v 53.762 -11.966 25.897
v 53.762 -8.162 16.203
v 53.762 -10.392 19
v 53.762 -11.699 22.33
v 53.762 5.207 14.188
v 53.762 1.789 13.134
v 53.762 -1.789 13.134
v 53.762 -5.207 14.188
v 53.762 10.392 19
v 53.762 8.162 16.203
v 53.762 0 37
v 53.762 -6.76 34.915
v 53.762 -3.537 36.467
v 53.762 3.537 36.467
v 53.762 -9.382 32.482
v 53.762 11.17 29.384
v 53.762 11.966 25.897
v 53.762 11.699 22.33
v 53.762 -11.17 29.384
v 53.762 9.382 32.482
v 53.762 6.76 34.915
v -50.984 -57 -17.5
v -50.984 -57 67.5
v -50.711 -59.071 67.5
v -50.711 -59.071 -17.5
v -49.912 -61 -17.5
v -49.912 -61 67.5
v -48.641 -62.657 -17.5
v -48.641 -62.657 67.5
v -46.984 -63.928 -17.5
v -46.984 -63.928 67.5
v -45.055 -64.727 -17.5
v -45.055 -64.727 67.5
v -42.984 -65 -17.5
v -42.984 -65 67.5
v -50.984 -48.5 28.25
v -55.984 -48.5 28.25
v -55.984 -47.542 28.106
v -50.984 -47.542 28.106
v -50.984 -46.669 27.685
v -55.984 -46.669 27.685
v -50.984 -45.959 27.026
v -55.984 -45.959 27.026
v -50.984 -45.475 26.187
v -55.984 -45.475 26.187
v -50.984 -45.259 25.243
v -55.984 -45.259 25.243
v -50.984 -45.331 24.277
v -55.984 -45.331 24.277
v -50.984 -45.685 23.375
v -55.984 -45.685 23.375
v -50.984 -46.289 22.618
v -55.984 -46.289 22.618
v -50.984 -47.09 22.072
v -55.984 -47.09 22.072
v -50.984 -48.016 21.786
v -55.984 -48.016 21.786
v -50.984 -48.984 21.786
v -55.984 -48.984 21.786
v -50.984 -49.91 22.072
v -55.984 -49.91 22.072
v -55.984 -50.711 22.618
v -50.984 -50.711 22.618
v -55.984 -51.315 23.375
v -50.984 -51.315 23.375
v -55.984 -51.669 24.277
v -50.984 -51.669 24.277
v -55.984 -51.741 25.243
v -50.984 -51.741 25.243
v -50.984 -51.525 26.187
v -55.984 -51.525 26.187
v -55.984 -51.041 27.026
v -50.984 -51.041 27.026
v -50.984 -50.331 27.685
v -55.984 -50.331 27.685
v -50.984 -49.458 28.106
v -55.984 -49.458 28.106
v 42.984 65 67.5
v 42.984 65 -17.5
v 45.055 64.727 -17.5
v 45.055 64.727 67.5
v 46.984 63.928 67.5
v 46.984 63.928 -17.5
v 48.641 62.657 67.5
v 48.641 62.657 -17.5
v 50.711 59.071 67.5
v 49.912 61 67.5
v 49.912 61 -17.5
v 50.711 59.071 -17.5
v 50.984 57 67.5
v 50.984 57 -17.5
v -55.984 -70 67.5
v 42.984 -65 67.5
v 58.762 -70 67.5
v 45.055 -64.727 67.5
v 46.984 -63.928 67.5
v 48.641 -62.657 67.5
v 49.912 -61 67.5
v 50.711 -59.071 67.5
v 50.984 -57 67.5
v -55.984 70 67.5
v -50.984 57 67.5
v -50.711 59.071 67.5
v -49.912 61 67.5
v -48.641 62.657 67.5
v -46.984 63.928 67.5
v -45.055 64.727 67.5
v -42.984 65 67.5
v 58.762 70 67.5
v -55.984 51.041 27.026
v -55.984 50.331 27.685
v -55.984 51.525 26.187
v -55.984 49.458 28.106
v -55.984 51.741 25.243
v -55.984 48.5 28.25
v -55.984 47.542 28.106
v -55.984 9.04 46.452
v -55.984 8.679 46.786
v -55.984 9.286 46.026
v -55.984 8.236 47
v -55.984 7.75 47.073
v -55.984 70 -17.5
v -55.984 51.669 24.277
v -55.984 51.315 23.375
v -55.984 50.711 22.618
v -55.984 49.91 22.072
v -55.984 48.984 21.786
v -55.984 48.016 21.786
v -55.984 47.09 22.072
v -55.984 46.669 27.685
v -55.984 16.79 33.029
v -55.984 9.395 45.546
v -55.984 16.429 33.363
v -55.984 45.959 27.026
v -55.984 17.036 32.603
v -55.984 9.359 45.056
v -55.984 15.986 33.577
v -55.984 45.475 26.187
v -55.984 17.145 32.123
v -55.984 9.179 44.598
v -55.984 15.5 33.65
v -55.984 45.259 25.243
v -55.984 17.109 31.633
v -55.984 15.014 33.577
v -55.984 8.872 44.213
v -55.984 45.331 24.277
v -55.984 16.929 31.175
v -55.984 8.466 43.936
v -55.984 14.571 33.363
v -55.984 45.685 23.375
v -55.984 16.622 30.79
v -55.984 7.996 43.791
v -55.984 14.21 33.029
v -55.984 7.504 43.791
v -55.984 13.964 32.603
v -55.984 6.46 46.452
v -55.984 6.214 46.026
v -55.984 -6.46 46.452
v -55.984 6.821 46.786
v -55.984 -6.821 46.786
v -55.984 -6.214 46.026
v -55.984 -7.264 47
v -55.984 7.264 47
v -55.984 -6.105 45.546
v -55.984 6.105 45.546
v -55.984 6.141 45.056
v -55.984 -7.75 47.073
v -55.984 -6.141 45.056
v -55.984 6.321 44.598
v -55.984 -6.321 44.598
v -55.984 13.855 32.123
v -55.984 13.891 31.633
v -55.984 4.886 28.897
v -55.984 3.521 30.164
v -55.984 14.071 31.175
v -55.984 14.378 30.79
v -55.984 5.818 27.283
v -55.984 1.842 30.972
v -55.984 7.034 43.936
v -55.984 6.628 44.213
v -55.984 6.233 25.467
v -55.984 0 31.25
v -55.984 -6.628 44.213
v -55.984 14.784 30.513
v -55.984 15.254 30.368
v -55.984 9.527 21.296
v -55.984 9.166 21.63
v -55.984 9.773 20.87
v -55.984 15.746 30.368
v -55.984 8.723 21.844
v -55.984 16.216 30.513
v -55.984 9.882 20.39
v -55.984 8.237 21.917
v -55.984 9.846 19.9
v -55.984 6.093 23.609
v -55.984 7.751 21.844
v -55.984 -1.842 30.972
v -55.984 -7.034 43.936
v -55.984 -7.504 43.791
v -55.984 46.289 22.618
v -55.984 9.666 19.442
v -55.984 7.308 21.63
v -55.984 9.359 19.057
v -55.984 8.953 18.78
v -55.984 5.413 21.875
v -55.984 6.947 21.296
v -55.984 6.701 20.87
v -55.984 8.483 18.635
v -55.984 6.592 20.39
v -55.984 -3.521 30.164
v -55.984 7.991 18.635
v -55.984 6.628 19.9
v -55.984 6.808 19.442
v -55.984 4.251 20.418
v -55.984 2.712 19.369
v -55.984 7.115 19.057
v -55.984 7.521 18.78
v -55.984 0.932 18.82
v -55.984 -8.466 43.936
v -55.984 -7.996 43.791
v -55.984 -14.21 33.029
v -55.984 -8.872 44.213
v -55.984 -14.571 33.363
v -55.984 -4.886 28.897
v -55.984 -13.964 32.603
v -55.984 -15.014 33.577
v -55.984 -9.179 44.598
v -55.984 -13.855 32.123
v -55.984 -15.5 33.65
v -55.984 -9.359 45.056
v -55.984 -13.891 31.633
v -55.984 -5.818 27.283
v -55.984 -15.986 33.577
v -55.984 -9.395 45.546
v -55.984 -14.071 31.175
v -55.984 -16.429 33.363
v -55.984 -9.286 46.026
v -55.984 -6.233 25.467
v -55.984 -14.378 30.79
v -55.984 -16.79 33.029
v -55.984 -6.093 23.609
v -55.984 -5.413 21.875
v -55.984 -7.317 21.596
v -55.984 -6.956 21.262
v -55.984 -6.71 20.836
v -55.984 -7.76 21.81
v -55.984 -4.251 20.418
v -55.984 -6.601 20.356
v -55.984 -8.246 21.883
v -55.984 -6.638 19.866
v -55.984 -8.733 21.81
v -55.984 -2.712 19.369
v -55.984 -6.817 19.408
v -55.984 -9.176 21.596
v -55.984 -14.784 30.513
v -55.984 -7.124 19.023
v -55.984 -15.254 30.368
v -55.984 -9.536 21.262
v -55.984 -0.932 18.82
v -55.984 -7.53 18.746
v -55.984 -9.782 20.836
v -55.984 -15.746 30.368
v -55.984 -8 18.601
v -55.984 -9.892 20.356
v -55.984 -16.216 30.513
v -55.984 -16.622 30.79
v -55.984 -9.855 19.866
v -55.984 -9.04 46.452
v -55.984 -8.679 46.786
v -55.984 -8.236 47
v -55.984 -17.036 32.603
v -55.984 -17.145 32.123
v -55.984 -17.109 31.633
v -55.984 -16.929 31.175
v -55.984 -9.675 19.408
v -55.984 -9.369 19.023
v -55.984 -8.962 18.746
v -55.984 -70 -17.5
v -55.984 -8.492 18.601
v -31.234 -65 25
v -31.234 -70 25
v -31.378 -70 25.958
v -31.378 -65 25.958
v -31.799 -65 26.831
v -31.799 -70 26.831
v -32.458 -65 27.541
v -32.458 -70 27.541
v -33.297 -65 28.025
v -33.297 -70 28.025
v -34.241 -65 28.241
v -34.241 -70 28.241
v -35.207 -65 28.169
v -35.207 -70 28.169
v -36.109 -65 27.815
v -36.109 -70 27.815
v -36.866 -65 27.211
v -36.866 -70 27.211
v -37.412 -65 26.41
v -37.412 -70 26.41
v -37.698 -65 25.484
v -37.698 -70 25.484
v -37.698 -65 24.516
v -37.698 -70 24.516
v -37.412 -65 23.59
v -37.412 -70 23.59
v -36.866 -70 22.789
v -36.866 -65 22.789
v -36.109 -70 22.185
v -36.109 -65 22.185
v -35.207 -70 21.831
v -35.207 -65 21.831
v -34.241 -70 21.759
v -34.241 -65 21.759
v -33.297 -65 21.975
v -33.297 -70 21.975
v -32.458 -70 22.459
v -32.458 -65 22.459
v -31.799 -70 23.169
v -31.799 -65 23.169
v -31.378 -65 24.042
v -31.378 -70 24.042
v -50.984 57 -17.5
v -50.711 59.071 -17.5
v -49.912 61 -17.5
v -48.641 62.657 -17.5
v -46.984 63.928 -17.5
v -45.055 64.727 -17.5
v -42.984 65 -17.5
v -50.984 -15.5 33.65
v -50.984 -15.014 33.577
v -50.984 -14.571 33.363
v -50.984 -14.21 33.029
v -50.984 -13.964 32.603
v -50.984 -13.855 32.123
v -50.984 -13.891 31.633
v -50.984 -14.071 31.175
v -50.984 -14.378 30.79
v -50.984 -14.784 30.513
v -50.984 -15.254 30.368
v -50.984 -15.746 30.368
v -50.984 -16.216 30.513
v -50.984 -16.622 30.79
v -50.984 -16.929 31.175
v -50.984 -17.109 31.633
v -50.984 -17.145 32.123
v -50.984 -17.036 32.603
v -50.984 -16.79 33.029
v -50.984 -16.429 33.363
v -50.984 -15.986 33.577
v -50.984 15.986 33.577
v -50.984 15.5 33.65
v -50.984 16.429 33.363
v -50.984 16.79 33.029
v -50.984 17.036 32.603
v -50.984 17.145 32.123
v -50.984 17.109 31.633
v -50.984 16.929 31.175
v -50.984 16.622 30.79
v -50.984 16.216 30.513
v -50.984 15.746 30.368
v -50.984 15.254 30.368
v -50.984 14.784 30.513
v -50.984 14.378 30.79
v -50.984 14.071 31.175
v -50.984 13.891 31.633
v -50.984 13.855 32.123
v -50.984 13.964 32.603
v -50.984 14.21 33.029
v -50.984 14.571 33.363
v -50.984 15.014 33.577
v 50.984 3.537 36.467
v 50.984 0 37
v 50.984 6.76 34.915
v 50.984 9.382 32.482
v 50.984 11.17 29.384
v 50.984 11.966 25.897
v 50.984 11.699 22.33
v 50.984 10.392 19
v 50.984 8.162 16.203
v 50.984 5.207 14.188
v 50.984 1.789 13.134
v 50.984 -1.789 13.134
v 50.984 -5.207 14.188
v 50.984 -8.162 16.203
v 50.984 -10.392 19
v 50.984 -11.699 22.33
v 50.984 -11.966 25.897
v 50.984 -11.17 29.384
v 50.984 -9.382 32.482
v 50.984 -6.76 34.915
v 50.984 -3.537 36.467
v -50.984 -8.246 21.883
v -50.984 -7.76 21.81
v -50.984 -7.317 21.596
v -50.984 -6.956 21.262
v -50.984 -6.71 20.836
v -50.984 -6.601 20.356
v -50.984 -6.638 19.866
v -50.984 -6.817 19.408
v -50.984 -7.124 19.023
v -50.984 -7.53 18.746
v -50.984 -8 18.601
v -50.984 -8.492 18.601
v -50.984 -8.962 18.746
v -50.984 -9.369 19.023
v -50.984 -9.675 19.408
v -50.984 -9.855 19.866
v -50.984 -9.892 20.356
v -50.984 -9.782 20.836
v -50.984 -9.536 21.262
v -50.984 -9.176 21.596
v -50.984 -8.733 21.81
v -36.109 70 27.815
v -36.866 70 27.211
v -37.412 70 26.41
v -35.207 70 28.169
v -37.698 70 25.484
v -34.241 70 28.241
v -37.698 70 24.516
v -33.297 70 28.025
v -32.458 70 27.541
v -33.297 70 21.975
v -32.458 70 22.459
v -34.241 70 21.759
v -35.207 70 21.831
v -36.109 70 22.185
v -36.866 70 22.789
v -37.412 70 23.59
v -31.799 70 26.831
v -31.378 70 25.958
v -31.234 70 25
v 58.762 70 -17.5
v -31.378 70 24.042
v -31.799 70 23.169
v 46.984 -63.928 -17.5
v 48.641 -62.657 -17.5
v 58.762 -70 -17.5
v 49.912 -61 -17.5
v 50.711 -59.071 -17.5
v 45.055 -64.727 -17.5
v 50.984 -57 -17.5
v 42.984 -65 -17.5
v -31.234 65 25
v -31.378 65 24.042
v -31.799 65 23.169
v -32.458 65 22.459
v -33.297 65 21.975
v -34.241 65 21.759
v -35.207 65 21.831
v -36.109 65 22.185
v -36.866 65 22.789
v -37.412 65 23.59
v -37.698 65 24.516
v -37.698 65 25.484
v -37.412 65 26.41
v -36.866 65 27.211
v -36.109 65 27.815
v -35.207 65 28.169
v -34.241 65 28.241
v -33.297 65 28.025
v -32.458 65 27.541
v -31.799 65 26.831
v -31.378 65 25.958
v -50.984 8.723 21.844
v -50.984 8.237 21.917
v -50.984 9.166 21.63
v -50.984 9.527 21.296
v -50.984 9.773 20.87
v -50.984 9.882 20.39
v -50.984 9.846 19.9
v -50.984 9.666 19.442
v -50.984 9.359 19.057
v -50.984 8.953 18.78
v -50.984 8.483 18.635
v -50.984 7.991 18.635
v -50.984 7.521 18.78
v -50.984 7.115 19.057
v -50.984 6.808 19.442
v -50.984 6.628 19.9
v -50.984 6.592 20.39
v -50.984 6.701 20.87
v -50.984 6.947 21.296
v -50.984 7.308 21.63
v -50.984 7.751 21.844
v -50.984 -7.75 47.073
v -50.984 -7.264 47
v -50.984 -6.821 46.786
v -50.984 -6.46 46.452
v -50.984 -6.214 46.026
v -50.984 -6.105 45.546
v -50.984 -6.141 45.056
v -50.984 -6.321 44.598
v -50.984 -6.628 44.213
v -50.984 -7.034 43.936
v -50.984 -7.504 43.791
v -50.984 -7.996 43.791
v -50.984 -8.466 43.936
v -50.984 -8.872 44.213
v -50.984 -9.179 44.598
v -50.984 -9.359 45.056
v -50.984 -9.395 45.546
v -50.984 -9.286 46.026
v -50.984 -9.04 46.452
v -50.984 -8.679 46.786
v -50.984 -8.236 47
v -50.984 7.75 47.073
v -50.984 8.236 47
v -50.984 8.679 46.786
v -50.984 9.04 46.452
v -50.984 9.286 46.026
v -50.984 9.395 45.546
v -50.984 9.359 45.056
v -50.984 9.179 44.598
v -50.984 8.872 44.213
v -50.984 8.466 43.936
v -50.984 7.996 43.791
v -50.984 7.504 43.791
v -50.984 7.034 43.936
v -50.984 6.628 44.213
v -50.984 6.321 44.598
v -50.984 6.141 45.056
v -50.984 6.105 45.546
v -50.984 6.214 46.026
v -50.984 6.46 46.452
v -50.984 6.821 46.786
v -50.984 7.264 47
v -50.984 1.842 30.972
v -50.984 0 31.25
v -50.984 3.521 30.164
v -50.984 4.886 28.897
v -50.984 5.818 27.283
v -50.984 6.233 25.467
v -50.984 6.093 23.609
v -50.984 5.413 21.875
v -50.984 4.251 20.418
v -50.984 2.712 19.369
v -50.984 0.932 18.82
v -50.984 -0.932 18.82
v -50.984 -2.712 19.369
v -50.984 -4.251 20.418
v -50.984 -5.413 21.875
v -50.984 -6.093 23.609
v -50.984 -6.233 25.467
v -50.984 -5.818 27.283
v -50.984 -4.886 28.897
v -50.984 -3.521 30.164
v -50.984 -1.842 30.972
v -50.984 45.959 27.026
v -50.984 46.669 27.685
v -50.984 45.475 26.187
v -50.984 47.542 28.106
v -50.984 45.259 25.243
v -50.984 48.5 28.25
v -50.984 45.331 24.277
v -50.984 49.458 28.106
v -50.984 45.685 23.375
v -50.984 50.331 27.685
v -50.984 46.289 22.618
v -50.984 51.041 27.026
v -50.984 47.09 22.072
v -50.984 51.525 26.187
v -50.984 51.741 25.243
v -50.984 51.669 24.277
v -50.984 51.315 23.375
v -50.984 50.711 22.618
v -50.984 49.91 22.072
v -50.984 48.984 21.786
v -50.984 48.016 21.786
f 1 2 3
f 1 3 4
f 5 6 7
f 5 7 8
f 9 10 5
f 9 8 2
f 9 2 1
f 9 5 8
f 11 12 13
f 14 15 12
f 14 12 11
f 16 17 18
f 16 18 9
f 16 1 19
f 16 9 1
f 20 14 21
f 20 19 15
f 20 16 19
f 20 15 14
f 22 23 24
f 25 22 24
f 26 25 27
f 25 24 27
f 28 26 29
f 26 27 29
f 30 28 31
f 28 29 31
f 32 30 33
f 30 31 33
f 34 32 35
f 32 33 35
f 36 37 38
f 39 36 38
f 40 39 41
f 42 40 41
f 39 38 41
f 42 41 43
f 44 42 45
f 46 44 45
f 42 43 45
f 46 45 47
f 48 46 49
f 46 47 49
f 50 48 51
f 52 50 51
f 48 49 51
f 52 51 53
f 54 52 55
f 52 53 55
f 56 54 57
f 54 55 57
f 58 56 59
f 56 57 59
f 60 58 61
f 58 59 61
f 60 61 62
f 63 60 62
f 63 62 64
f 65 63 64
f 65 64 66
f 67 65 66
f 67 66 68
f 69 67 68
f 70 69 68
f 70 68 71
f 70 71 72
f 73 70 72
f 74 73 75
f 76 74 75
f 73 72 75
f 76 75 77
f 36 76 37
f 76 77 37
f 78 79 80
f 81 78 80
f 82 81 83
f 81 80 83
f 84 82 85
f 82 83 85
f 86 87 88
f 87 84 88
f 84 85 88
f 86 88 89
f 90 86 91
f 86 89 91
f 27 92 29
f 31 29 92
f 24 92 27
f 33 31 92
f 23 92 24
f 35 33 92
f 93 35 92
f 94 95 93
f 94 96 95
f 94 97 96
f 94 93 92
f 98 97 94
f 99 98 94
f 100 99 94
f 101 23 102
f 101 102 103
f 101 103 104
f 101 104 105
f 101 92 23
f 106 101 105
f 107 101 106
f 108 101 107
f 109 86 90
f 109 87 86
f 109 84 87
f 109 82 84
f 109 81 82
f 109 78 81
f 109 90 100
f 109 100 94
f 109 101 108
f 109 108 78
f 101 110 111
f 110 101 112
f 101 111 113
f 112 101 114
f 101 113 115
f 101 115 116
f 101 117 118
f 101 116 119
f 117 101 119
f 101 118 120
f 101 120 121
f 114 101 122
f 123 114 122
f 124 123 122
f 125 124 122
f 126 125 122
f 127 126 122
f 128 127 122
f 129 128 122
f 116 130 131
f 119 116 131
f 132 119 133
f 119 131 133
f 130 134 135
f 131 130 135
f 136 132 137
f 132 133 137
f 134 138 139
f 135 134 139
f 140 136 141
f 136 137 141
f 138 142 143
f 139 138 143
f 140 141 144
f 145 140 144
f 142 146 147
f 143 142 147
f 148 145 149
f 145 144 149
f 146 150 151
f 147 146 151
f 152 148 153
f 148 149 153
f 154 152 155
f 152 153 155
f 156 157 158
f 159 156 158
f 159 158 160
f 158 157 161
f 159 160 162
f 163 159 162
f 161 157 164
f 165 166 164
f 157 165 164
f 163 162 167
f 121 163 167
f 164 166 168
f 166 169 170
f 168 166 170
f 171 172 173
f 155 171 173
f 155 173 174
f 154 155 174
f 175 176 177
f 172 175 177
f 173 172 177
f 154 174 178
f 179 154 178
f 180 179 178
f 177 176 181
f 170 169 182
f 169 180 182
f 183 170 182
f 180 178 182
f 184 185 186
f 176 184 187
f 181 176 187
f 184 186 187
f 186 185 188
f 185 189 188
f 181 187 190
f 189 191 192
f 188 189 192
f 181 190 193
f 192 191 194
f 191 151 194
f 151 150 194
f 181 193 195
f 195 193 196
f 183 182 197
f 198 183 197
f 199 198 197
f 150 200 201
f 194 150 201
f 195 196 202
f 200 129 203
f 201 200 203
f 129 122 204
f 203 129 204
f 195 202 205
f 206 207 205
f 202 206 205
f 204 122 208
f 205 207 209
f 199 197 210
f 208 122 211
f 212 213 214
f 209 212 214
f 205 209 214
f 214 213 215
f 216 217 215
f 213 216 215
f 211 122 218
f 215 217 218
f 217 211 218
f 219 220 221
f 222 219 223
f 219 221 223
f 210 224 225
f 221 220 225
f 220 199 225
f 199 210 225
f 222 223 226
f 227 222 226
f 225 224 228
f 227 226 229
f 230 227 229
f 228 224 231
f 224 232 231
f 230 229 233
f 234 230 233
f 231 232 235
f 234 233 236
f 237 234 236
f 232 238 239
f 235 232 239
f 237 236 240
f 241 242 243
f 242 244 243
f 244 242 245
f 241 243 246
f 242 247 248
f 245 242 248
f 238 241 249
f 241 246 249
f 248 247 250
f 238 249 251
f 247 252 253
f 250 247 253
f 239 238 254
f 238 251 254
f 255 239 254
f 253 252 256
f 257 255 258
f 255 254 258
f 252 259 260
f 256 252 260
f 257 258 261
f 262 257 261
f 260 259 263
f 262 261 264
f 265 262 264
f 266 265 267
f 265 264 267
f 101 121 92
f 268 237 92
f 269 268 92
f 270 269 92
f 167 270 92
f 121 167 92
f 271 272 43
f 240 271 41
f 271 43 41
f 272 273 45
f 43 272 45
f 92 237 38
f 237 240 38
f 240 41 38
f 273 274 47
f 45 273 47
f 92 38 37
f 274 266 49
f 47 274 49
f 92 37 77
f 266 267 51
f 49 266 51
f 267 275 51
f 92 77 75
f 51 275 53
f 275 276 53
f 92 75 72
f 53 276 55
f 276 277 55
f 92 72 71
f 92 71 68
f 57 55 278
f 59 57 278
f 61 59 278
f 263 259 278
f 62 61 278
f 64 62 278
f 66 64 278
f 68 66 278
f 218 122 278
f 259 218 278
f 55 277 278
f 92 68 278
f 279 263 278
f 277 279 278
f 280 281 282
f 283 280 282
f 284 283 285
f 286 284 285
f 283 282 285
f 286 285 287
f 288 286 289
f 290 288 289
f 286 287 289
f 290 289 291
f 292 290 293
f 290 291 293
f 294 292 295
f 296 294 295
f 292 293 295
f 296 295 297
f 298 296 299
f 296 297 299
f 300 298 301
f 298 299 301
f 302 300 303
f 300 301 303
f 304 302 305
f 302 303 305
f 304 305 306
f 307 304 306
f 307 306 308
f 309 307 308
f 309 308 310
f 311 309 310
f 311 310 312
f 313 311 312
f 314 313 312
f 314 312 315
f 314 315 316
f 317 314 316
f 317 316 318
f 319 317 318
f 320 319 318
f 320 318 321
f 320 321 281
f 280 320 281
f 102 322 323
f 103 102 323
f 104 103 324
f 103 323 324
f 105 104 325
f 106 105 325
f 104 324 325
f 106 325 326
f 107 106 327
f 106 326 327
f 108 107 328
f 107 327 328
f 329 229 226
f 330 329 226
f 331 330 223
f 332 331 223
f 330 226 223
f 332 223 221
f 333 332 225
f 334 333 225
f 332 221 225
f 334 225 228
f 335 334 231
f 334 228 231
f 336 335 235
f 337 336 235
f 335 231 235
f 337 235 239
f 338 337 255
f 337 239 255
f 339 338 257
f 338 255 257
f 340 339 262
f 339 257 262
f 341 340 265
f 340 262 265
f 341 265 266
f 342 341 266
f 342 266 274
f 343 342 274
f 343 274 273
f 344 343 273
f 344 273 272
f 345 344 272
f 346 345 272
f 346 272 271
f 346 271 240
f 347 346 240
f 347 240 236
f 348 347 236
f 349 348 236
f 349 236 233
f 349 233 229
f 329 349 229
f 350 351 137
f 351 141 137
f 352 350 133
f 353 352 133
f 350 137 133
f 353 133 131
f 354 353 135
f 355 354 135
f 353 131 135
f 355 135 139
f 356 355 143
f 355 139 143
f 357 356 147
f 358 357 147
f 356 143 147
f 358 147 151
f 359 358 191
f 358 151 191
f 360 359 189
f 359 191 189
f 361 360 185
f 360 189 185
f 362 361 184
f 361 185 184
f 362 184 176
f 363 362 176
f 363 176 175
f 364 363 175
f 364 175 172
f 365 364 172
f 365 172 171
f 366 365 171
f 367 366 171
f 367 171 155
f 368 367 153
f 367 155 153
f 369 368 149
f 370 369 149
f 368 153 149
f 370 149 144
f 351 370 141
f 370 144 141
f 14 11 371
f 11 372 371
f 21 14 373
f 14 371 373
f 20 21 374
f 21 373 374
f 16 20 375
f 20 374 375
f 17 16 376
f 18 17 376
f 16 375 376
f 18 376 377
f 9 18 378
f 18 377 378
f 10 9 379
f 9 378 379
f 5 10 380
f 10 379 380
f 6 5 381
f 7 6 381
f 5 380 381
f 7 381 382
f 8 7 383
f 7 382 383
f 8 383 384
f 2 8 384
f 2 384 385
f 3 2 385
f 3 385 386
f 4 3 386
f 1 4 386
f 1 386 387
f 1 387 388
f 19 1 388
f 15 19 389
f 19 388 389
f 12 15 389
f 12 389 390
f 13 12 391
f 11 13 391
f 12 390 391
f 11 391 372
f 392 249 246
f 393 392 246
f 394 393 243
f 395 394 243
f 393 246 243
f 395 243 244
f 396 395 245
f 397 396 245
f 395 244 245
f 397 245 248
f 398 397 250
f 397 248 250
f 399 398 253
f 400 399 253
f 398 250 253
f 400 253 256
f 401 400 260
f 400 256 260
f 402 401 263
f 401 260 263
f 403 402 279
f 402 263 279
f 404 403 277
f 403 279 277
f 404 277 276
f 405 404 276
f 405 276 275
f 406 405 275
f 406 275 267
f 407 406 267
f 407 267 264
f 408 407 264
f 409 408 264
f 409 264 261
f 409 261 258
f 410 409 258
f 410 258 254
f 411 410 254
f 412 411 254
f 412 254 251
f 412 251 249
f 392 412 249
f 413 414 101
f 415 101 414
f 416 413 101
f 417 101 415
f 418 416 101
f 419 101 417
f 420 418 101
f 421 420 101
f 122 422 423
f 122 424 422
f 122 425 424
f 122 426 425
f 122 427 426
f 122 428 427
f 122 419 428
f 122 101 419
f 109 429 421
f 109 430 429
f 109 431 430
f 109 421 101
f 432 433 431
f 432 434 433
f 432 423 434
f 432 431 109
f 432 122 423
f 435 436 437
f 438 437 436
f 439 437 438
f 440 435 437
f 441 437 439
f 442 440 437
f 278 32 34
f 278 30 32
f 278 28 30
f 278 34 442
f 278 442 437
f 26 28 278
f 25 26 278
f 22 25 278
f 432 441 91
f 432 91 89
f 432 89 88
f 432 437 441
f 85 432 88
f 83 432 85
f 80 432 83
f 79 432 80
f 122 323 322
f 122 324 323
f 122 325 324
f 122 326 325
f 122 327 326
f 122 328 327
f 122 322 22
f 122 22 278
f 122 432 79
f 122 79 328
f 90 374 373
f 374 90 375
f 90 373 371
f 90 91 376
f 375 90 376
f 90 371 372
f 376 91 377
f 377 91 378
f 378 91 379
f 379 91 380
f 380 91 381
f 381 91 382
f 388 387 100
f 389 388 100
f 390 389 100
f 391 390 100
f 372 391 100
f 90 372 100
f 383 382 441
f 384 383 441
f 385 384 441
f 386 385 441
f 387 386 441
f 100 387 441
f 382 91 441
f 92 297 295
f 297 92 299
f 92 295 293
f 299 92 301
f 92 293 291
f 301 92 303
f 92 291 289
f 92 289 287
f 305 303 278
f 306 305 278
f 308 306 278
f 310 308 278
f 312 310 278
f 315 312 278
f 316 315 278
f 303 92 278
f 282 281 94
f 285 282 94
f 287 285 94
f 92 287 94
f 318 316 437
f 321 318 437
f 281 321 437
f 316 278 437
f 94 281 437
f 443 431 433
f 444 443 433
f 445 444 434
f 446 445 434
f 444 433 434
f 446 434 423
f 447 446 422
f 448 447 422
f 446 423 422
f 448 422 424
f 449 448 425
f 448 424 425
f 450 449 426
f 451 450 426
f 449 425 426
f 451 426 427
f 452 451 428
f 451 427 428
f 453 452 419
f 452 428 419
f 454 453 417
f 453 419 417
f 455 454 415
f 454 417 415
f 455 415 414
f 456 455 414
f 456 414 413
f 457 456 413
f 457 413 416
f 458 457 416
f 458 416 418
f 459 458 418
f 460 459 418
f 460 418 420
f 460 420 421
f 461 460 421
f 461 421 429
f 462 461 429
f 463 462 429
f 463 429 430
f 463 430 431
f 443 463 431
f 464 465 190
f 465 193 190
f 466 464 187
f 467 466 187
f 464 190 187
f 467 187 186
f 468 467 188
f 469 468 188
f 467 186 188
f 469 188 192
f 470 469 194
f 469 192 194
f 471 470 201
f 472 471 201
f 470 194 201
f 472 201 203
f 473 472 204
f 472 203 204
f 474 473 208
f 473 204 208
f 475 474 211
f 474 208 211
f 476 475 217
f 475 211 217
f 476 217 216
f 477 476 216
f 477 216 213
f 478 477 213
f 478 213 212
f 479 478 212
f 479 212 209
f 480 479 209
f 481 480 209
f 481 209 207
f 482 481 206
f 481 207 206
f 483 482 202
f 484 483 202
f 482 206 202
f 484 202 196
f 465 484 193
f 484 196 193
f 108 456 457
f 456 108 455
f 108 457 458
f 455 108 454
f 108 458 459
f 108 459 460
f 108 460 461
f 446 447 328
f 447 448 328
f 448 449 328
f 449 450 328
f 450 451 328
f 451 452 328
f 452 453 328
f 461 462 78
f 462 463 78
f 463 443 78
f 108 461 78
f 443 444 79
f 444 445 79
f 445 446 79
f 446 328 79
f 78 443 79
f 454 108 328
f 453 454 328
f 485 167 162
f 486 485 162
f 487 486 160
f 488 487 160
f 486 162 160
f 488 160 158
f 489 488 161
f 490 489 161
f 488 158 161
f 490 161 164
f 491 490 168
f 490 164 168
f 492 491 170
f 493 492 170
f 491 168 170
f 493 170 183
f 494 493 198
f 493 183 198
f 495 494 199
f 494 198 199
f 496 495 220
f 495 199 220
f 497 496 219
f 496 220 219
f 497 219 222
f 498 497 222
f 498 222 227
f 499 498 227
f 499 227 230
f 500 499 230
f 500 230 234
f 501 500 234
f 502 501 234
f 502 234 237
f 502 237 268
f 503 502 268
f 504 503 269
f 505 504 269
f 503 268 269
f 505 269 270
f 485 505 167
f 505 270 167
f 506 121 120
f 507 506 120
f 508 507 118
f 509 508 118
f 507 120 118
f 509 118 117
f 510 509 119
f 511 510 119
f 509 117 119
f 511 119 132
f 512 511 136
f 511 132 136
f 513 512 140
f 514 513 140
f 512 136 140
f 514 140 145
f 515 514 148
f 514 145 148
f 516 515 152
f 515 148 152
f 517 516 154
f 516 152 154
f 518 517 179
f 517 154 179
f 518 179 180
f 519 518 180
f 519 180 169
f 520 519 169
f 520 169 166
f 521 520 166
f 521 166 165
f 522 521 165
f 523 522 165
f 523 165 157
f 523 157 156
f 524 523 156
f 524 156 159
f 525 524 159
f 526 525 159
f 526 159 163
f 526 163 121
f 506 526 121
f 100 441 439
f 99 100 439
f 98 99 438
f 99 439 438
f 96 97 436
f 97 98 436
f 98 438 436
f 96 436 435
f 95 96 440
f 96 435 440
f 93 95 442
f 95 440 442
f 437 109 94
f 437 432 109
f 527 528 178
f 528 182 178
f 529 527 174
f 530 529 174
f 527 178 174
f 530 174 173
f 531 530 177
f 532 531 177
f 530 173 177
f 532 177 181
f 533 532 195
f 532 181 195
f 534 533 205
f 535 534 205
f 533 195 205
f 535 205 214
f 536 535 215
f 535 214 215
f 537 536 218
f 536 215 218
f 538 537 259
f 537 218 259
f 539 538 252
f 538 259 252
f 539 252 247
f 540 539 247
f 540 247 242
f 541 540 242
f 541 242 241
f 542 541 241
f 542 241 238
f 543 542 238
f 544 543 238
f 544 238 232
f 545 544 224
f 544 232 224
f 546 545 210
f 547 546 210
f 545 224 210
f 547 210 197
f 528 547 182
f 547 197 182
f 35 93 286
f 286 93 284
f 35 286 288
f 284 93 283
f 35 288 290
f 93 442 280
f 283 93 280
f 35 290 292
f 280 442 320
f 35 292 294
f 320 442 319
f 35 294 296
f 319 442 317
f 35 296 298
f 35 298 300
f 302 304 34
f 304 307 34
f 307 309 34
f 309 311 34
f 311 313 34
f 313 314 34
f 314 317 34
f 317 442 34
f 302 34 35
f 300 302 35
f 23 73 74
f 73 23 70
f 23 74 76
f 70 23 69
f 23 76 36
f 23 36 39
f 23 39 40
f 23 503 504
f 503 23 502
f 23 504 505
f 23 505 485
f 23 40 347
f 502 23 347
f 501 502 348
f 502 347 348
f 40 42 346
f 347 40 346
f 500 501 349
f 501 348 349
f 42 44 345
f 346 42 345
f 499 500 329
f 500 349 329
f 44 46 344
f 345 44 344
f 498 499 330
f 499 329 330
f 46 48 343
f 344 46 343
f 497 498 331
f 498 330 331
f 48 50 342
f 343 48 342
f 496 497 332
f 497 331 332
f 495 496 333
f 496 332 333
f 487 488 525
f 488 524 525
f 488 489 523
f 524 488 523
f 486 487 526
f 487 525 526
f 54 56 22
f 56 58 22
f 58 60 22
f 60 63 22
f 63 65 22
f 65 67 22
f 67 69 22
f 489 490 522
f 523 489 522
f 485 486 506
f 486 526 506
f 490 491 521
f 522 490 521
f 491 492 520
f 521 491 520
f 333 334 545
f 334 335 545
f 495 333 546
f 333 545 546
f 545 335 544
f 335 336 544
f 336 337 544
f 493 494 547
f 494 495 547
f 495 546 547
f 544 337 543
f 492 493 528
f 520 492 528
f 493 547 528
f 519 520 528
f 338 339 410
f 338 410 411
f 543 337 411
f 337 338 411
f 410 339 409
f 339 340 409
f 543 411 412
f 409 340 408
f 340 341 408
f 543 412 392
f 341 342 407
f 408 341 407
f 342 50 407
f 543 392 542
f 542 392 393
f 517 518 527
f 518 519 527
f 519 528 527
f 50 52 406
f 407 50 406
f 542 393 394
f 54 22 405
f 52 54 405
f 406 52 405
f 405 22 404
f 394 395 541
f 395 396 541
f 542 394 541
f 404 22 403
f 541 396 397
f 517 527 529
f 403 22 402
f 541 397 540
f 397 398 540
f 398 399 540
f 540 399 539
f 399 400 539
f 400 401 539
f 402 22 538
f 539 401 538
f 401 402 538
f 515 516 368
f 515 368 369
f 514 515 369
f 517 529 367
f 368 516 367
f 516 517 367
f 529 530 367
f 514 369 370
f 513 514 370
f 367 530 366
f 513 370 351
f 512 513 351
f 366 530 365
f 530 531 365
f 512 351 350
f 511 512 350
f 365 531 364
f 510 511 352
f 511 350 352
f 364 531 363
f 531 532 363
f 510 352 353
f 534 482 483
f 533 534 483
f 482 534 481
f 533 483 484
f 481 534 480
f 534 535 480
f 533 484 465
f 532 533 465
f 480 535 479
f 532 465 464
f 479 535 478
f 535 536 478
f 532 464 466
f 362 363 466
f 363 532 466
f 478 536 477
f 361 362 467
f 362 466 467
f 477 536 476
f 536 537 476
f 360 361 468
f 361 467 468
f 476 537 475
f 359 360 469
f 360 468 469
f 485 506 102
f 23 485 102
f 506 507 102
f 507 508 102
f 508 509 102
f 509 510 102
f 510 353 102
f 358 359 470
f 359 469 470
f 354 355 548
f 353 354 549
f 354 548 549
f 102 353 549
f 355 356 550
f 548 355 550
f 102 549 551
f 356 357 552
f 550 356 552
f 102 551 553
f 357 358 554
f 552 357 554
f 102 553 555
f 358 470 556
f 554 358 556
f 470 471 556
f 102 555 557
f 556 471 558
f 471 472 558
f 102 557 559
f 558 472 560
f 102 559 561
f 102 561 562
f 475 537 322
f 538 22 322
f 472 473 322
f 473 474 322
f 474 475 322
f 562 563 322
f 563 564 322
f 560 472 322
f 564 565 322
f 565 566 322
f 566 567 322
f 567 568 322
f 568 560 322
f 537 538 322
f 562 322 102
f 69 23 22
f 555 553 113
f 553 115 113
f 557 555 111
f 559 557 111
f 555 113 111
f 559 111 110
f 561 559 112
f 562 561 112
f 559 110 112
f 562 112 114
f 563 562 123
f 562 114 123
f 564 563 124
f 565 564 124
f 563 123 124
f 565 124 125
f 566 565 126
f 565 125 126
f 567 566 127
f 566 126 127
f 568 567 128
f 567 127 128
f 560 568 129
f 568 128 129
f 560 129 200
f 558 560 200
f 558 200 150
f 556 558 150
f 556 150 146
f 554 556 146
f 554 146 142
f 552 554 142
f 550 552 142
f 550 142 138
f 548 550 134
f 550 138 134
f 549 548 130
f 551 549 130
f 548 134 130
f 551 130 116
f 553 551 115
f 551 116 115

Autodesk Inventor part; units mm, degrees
ref_plane "YZ Plane" through (0, 0, 0) normal (1, 0, 0) x (0, 1, 0)
ref_plane "XZ Plane" through (0, 0, 0) normal (0, 1, 0) x (-1, 0, 0)
ref_plane "XY Plane" through (0, 0, 0) normal (0, 0, 1) x (1, 0, 0)
sketch "Sketch1" plane through (0, 0, 0) normal (0, 0, 1) x (1, 0, 0)
  line L0 (-50.984, -65) -> (50.984, -65)
  line L1 (50.984, -65) -> (50.984, 65)
  line L2 (50.984, 65) -> (-50.984, 65)
  line L3 (-50.984, 65) -> (-50.984, -65)
  line L4 (-50.984, -65) -> (50.984, 65) construction
  line L5 (50.984, -65) -> (-50.984, 65) construction
  line L6 (-55.984, 70) -> (55.984, 70)
  line L7 (55.984, 70) -> (55.984, -70)
  line L8 (55.984, -70) -> (-55.984, -70)
  line L9 (-55.984, -70) -> (-55.984, 70)
  point P0 (0, 0)
  dimension "d0" = 101.968
  dimension "d1" = 130
  dimension "d2" = 5
extrude "Extrusion1" add sketch "Sketch1" along normal blind 50
sketch "Sketch5" plane through (50.984, -65, 0) normal (-1, 0, 0) x (0, 0, 1)
  line L0 (0, -5) -> (50, -5) projected
  line L1 (0, 135) -> (50, 135) projected
  circle A0 centre (25, 65) radius 12
  line L2 (50, 135) -> (50, -5) projected
  point P0 (0, 65)
  dimension "d14" = 140
  dimension "d15" = 24
  dimension "d16" = 25
  dimension "d17" = 70
extrude "Extrusion5" cut sketch "Sketch5" against normal blind 2.778
sketch "Sketch6" plane through (55.984, -70, 0) normal (1, 0, 0) x (0, 0, -1)
  line L0 (0, 0) -> (0, 140) projected
  line L1 (0, 140) -> (-50, 140) projected
  line L2 (-50, 0) -> (-50, 140) projected
  line L3 (0, 0) -> (-50, 0) projected
  point P0 (0, 70)
extrude "Extrusion6" add sketch "Sketch6" along normal blind 2.778
sketch "Sketch8" plane through (0, 0, 0) normal (0, 0, -1) x (-1, 0, 0)
  line L0 (55.984, -70) -> (-58.762, -70) projected
  line L1 (55.984, 70) -> (55.984, -70) projected
  line L2 (55.984, 70) -> (-58.762, 70) projected
  line L3 (-58.762, -70) -> (-58.762, 70) projected
  line L4 (50.984, -65) -> (50.984, 65) projected
  line L5 (-50.984, -65) -> (50.984, -65) projected
  line L6 (-50.984, 65) -> (-50.984, -65) projected
  line L7 (50.984, 65) -> (-50.984, 65) projected
  point P0 (0, 0)
extrude "Extrusion8" add sketch "Sketch8" along normal blind 17.5
sketch "Sketch9" plane through (0, 0, 50) normal (0, 0, 1) x (1, 0, 0)
  line L0 (-55.984, -70) -> (58.762, -70) projected
  line L1 (58.762, 70) -> (58.762, -70) projected
  line L2 (-55.984, 70) -> (58.762, 70) projected
  line L3 (-55.984, 70) -> (-55.984, -70) projected
  line L4 (-50.984, -65) -> (-50.984, 65) projected
  line L5 (-50.984, 65) -> (50.984, 65) projected
  line L6 (50.984, 65) -> (50.984, -65) projected
  line L7 (50.984, -65) -> (-50.984, -65) projected
  point P0 (0, 0)
extrude "Extrusion9" add sketch "Sketch9" along normal blind 17.5
fillet "Fillet1" radius 8 1 edges at (-50.984, -65, 25)
fillet "Fillet2" radius 8 3 edges at (50.984, -65, 25) (50.984, 65, 25) (-50.984, 65, 25)
sketch "Sketch10" plane through (-55.984, -70, -17.5) normal (-1, 0, 0) x (0, 0, 1)
  circle A0 centre (42.5, 70) radius 6.25
  circle A1 centre (37.767, 78.237) radius 1.65
  line L0 (0, 0) -> (0, 140) projected
  line L1 (85, 0) -> (0, 0) projected
  circle A2 centre (37.733, 61.7537) radius 1.65
  circle A3 centre (49.5, 85.5) radius 1.65
  circle A4 centre (49.5, 54.5) radius 1.65
  circle A5 centre (62.923, 77.75) radius 1.65
  circle A6 centre (62.923, 62.25) radius 1.65
  point P0 (17.5, 70)
  dimension "d31" = 12.5
  dimension "d32" = 3.3
  dimension "d33" = 37.767
  dimension "d34" = 78.237
  dimension "d35" = 3.3
  dimension "d36" = 37.733
  dimension "d38" = 61.7537
  dimension "d39" = 3.3
  dimension "d41" = 85.5
  dimension "d42" = 49.5
  dimension "d43" = 3.3
  dimension "d44" = 54.5
  dimension "d45" = 3.3
  dimension "d46" = 77.75
  dimension "d47" = 62.923
  dimension "d48" = 3.3
  dimension "d49" = 62.25
  dimension "d50" = 62.923
extrude "Extrusion10" cut sketch "Sketch10" against normal blind 5
sketch "Sketch11" plane through (-55.984, -70, -17.5) normal (-1, 0, 0) x (0, 0, 1)
  circle A0 centre (42.5, 21.5) radius 3.25
  circle A1 centre (42.5, 118.5) radius 3.25
  line L0 (0, 140) -> (85, 140) projected
  line L1 (85, 0) -> (0, 0) projected
  point P0 (17.5, 70)
  dimension "d53" = 6.5
  dimension "d54" = 6.5
  dimension "d58" = 21.5
  dimension "d59" = 21.5
extrude "Extrusion12" cut sketch "Sketch11" against normal blind 10
sketch "Sketch12" plane through (-55.984, -70, -17.5) normal (0, -1, 0) x (1, 0, 0)
  circle A0 centre (21.5, 42.5) radius 3.25
  line L0 (0, 85) -> (0, 0) projected
  point P0 (55.984, 17.5)
  dimension "d62" = 6.5
  dimension "d63" = 21.5
sketch "Sketch13" plane through (-55.984, 70, -17.5) normal (0, 1, 0) x (1, 0, 0)
  circle A0 centre (21.5, -42.5) radius 3.25
  line L0 (0, 0) -> (0, -85) projected
  point P0 (55.984, -17.5)
  dimension "d66" = 6.5
  dimension "d67" = 21.5
extrude "Extrusion13" cut sketch "Sketch12" against normal blind 10
extrude "Extrusion14" cut sketch "Sketch13" against normal blind 10
properties part number "caja conexion"
